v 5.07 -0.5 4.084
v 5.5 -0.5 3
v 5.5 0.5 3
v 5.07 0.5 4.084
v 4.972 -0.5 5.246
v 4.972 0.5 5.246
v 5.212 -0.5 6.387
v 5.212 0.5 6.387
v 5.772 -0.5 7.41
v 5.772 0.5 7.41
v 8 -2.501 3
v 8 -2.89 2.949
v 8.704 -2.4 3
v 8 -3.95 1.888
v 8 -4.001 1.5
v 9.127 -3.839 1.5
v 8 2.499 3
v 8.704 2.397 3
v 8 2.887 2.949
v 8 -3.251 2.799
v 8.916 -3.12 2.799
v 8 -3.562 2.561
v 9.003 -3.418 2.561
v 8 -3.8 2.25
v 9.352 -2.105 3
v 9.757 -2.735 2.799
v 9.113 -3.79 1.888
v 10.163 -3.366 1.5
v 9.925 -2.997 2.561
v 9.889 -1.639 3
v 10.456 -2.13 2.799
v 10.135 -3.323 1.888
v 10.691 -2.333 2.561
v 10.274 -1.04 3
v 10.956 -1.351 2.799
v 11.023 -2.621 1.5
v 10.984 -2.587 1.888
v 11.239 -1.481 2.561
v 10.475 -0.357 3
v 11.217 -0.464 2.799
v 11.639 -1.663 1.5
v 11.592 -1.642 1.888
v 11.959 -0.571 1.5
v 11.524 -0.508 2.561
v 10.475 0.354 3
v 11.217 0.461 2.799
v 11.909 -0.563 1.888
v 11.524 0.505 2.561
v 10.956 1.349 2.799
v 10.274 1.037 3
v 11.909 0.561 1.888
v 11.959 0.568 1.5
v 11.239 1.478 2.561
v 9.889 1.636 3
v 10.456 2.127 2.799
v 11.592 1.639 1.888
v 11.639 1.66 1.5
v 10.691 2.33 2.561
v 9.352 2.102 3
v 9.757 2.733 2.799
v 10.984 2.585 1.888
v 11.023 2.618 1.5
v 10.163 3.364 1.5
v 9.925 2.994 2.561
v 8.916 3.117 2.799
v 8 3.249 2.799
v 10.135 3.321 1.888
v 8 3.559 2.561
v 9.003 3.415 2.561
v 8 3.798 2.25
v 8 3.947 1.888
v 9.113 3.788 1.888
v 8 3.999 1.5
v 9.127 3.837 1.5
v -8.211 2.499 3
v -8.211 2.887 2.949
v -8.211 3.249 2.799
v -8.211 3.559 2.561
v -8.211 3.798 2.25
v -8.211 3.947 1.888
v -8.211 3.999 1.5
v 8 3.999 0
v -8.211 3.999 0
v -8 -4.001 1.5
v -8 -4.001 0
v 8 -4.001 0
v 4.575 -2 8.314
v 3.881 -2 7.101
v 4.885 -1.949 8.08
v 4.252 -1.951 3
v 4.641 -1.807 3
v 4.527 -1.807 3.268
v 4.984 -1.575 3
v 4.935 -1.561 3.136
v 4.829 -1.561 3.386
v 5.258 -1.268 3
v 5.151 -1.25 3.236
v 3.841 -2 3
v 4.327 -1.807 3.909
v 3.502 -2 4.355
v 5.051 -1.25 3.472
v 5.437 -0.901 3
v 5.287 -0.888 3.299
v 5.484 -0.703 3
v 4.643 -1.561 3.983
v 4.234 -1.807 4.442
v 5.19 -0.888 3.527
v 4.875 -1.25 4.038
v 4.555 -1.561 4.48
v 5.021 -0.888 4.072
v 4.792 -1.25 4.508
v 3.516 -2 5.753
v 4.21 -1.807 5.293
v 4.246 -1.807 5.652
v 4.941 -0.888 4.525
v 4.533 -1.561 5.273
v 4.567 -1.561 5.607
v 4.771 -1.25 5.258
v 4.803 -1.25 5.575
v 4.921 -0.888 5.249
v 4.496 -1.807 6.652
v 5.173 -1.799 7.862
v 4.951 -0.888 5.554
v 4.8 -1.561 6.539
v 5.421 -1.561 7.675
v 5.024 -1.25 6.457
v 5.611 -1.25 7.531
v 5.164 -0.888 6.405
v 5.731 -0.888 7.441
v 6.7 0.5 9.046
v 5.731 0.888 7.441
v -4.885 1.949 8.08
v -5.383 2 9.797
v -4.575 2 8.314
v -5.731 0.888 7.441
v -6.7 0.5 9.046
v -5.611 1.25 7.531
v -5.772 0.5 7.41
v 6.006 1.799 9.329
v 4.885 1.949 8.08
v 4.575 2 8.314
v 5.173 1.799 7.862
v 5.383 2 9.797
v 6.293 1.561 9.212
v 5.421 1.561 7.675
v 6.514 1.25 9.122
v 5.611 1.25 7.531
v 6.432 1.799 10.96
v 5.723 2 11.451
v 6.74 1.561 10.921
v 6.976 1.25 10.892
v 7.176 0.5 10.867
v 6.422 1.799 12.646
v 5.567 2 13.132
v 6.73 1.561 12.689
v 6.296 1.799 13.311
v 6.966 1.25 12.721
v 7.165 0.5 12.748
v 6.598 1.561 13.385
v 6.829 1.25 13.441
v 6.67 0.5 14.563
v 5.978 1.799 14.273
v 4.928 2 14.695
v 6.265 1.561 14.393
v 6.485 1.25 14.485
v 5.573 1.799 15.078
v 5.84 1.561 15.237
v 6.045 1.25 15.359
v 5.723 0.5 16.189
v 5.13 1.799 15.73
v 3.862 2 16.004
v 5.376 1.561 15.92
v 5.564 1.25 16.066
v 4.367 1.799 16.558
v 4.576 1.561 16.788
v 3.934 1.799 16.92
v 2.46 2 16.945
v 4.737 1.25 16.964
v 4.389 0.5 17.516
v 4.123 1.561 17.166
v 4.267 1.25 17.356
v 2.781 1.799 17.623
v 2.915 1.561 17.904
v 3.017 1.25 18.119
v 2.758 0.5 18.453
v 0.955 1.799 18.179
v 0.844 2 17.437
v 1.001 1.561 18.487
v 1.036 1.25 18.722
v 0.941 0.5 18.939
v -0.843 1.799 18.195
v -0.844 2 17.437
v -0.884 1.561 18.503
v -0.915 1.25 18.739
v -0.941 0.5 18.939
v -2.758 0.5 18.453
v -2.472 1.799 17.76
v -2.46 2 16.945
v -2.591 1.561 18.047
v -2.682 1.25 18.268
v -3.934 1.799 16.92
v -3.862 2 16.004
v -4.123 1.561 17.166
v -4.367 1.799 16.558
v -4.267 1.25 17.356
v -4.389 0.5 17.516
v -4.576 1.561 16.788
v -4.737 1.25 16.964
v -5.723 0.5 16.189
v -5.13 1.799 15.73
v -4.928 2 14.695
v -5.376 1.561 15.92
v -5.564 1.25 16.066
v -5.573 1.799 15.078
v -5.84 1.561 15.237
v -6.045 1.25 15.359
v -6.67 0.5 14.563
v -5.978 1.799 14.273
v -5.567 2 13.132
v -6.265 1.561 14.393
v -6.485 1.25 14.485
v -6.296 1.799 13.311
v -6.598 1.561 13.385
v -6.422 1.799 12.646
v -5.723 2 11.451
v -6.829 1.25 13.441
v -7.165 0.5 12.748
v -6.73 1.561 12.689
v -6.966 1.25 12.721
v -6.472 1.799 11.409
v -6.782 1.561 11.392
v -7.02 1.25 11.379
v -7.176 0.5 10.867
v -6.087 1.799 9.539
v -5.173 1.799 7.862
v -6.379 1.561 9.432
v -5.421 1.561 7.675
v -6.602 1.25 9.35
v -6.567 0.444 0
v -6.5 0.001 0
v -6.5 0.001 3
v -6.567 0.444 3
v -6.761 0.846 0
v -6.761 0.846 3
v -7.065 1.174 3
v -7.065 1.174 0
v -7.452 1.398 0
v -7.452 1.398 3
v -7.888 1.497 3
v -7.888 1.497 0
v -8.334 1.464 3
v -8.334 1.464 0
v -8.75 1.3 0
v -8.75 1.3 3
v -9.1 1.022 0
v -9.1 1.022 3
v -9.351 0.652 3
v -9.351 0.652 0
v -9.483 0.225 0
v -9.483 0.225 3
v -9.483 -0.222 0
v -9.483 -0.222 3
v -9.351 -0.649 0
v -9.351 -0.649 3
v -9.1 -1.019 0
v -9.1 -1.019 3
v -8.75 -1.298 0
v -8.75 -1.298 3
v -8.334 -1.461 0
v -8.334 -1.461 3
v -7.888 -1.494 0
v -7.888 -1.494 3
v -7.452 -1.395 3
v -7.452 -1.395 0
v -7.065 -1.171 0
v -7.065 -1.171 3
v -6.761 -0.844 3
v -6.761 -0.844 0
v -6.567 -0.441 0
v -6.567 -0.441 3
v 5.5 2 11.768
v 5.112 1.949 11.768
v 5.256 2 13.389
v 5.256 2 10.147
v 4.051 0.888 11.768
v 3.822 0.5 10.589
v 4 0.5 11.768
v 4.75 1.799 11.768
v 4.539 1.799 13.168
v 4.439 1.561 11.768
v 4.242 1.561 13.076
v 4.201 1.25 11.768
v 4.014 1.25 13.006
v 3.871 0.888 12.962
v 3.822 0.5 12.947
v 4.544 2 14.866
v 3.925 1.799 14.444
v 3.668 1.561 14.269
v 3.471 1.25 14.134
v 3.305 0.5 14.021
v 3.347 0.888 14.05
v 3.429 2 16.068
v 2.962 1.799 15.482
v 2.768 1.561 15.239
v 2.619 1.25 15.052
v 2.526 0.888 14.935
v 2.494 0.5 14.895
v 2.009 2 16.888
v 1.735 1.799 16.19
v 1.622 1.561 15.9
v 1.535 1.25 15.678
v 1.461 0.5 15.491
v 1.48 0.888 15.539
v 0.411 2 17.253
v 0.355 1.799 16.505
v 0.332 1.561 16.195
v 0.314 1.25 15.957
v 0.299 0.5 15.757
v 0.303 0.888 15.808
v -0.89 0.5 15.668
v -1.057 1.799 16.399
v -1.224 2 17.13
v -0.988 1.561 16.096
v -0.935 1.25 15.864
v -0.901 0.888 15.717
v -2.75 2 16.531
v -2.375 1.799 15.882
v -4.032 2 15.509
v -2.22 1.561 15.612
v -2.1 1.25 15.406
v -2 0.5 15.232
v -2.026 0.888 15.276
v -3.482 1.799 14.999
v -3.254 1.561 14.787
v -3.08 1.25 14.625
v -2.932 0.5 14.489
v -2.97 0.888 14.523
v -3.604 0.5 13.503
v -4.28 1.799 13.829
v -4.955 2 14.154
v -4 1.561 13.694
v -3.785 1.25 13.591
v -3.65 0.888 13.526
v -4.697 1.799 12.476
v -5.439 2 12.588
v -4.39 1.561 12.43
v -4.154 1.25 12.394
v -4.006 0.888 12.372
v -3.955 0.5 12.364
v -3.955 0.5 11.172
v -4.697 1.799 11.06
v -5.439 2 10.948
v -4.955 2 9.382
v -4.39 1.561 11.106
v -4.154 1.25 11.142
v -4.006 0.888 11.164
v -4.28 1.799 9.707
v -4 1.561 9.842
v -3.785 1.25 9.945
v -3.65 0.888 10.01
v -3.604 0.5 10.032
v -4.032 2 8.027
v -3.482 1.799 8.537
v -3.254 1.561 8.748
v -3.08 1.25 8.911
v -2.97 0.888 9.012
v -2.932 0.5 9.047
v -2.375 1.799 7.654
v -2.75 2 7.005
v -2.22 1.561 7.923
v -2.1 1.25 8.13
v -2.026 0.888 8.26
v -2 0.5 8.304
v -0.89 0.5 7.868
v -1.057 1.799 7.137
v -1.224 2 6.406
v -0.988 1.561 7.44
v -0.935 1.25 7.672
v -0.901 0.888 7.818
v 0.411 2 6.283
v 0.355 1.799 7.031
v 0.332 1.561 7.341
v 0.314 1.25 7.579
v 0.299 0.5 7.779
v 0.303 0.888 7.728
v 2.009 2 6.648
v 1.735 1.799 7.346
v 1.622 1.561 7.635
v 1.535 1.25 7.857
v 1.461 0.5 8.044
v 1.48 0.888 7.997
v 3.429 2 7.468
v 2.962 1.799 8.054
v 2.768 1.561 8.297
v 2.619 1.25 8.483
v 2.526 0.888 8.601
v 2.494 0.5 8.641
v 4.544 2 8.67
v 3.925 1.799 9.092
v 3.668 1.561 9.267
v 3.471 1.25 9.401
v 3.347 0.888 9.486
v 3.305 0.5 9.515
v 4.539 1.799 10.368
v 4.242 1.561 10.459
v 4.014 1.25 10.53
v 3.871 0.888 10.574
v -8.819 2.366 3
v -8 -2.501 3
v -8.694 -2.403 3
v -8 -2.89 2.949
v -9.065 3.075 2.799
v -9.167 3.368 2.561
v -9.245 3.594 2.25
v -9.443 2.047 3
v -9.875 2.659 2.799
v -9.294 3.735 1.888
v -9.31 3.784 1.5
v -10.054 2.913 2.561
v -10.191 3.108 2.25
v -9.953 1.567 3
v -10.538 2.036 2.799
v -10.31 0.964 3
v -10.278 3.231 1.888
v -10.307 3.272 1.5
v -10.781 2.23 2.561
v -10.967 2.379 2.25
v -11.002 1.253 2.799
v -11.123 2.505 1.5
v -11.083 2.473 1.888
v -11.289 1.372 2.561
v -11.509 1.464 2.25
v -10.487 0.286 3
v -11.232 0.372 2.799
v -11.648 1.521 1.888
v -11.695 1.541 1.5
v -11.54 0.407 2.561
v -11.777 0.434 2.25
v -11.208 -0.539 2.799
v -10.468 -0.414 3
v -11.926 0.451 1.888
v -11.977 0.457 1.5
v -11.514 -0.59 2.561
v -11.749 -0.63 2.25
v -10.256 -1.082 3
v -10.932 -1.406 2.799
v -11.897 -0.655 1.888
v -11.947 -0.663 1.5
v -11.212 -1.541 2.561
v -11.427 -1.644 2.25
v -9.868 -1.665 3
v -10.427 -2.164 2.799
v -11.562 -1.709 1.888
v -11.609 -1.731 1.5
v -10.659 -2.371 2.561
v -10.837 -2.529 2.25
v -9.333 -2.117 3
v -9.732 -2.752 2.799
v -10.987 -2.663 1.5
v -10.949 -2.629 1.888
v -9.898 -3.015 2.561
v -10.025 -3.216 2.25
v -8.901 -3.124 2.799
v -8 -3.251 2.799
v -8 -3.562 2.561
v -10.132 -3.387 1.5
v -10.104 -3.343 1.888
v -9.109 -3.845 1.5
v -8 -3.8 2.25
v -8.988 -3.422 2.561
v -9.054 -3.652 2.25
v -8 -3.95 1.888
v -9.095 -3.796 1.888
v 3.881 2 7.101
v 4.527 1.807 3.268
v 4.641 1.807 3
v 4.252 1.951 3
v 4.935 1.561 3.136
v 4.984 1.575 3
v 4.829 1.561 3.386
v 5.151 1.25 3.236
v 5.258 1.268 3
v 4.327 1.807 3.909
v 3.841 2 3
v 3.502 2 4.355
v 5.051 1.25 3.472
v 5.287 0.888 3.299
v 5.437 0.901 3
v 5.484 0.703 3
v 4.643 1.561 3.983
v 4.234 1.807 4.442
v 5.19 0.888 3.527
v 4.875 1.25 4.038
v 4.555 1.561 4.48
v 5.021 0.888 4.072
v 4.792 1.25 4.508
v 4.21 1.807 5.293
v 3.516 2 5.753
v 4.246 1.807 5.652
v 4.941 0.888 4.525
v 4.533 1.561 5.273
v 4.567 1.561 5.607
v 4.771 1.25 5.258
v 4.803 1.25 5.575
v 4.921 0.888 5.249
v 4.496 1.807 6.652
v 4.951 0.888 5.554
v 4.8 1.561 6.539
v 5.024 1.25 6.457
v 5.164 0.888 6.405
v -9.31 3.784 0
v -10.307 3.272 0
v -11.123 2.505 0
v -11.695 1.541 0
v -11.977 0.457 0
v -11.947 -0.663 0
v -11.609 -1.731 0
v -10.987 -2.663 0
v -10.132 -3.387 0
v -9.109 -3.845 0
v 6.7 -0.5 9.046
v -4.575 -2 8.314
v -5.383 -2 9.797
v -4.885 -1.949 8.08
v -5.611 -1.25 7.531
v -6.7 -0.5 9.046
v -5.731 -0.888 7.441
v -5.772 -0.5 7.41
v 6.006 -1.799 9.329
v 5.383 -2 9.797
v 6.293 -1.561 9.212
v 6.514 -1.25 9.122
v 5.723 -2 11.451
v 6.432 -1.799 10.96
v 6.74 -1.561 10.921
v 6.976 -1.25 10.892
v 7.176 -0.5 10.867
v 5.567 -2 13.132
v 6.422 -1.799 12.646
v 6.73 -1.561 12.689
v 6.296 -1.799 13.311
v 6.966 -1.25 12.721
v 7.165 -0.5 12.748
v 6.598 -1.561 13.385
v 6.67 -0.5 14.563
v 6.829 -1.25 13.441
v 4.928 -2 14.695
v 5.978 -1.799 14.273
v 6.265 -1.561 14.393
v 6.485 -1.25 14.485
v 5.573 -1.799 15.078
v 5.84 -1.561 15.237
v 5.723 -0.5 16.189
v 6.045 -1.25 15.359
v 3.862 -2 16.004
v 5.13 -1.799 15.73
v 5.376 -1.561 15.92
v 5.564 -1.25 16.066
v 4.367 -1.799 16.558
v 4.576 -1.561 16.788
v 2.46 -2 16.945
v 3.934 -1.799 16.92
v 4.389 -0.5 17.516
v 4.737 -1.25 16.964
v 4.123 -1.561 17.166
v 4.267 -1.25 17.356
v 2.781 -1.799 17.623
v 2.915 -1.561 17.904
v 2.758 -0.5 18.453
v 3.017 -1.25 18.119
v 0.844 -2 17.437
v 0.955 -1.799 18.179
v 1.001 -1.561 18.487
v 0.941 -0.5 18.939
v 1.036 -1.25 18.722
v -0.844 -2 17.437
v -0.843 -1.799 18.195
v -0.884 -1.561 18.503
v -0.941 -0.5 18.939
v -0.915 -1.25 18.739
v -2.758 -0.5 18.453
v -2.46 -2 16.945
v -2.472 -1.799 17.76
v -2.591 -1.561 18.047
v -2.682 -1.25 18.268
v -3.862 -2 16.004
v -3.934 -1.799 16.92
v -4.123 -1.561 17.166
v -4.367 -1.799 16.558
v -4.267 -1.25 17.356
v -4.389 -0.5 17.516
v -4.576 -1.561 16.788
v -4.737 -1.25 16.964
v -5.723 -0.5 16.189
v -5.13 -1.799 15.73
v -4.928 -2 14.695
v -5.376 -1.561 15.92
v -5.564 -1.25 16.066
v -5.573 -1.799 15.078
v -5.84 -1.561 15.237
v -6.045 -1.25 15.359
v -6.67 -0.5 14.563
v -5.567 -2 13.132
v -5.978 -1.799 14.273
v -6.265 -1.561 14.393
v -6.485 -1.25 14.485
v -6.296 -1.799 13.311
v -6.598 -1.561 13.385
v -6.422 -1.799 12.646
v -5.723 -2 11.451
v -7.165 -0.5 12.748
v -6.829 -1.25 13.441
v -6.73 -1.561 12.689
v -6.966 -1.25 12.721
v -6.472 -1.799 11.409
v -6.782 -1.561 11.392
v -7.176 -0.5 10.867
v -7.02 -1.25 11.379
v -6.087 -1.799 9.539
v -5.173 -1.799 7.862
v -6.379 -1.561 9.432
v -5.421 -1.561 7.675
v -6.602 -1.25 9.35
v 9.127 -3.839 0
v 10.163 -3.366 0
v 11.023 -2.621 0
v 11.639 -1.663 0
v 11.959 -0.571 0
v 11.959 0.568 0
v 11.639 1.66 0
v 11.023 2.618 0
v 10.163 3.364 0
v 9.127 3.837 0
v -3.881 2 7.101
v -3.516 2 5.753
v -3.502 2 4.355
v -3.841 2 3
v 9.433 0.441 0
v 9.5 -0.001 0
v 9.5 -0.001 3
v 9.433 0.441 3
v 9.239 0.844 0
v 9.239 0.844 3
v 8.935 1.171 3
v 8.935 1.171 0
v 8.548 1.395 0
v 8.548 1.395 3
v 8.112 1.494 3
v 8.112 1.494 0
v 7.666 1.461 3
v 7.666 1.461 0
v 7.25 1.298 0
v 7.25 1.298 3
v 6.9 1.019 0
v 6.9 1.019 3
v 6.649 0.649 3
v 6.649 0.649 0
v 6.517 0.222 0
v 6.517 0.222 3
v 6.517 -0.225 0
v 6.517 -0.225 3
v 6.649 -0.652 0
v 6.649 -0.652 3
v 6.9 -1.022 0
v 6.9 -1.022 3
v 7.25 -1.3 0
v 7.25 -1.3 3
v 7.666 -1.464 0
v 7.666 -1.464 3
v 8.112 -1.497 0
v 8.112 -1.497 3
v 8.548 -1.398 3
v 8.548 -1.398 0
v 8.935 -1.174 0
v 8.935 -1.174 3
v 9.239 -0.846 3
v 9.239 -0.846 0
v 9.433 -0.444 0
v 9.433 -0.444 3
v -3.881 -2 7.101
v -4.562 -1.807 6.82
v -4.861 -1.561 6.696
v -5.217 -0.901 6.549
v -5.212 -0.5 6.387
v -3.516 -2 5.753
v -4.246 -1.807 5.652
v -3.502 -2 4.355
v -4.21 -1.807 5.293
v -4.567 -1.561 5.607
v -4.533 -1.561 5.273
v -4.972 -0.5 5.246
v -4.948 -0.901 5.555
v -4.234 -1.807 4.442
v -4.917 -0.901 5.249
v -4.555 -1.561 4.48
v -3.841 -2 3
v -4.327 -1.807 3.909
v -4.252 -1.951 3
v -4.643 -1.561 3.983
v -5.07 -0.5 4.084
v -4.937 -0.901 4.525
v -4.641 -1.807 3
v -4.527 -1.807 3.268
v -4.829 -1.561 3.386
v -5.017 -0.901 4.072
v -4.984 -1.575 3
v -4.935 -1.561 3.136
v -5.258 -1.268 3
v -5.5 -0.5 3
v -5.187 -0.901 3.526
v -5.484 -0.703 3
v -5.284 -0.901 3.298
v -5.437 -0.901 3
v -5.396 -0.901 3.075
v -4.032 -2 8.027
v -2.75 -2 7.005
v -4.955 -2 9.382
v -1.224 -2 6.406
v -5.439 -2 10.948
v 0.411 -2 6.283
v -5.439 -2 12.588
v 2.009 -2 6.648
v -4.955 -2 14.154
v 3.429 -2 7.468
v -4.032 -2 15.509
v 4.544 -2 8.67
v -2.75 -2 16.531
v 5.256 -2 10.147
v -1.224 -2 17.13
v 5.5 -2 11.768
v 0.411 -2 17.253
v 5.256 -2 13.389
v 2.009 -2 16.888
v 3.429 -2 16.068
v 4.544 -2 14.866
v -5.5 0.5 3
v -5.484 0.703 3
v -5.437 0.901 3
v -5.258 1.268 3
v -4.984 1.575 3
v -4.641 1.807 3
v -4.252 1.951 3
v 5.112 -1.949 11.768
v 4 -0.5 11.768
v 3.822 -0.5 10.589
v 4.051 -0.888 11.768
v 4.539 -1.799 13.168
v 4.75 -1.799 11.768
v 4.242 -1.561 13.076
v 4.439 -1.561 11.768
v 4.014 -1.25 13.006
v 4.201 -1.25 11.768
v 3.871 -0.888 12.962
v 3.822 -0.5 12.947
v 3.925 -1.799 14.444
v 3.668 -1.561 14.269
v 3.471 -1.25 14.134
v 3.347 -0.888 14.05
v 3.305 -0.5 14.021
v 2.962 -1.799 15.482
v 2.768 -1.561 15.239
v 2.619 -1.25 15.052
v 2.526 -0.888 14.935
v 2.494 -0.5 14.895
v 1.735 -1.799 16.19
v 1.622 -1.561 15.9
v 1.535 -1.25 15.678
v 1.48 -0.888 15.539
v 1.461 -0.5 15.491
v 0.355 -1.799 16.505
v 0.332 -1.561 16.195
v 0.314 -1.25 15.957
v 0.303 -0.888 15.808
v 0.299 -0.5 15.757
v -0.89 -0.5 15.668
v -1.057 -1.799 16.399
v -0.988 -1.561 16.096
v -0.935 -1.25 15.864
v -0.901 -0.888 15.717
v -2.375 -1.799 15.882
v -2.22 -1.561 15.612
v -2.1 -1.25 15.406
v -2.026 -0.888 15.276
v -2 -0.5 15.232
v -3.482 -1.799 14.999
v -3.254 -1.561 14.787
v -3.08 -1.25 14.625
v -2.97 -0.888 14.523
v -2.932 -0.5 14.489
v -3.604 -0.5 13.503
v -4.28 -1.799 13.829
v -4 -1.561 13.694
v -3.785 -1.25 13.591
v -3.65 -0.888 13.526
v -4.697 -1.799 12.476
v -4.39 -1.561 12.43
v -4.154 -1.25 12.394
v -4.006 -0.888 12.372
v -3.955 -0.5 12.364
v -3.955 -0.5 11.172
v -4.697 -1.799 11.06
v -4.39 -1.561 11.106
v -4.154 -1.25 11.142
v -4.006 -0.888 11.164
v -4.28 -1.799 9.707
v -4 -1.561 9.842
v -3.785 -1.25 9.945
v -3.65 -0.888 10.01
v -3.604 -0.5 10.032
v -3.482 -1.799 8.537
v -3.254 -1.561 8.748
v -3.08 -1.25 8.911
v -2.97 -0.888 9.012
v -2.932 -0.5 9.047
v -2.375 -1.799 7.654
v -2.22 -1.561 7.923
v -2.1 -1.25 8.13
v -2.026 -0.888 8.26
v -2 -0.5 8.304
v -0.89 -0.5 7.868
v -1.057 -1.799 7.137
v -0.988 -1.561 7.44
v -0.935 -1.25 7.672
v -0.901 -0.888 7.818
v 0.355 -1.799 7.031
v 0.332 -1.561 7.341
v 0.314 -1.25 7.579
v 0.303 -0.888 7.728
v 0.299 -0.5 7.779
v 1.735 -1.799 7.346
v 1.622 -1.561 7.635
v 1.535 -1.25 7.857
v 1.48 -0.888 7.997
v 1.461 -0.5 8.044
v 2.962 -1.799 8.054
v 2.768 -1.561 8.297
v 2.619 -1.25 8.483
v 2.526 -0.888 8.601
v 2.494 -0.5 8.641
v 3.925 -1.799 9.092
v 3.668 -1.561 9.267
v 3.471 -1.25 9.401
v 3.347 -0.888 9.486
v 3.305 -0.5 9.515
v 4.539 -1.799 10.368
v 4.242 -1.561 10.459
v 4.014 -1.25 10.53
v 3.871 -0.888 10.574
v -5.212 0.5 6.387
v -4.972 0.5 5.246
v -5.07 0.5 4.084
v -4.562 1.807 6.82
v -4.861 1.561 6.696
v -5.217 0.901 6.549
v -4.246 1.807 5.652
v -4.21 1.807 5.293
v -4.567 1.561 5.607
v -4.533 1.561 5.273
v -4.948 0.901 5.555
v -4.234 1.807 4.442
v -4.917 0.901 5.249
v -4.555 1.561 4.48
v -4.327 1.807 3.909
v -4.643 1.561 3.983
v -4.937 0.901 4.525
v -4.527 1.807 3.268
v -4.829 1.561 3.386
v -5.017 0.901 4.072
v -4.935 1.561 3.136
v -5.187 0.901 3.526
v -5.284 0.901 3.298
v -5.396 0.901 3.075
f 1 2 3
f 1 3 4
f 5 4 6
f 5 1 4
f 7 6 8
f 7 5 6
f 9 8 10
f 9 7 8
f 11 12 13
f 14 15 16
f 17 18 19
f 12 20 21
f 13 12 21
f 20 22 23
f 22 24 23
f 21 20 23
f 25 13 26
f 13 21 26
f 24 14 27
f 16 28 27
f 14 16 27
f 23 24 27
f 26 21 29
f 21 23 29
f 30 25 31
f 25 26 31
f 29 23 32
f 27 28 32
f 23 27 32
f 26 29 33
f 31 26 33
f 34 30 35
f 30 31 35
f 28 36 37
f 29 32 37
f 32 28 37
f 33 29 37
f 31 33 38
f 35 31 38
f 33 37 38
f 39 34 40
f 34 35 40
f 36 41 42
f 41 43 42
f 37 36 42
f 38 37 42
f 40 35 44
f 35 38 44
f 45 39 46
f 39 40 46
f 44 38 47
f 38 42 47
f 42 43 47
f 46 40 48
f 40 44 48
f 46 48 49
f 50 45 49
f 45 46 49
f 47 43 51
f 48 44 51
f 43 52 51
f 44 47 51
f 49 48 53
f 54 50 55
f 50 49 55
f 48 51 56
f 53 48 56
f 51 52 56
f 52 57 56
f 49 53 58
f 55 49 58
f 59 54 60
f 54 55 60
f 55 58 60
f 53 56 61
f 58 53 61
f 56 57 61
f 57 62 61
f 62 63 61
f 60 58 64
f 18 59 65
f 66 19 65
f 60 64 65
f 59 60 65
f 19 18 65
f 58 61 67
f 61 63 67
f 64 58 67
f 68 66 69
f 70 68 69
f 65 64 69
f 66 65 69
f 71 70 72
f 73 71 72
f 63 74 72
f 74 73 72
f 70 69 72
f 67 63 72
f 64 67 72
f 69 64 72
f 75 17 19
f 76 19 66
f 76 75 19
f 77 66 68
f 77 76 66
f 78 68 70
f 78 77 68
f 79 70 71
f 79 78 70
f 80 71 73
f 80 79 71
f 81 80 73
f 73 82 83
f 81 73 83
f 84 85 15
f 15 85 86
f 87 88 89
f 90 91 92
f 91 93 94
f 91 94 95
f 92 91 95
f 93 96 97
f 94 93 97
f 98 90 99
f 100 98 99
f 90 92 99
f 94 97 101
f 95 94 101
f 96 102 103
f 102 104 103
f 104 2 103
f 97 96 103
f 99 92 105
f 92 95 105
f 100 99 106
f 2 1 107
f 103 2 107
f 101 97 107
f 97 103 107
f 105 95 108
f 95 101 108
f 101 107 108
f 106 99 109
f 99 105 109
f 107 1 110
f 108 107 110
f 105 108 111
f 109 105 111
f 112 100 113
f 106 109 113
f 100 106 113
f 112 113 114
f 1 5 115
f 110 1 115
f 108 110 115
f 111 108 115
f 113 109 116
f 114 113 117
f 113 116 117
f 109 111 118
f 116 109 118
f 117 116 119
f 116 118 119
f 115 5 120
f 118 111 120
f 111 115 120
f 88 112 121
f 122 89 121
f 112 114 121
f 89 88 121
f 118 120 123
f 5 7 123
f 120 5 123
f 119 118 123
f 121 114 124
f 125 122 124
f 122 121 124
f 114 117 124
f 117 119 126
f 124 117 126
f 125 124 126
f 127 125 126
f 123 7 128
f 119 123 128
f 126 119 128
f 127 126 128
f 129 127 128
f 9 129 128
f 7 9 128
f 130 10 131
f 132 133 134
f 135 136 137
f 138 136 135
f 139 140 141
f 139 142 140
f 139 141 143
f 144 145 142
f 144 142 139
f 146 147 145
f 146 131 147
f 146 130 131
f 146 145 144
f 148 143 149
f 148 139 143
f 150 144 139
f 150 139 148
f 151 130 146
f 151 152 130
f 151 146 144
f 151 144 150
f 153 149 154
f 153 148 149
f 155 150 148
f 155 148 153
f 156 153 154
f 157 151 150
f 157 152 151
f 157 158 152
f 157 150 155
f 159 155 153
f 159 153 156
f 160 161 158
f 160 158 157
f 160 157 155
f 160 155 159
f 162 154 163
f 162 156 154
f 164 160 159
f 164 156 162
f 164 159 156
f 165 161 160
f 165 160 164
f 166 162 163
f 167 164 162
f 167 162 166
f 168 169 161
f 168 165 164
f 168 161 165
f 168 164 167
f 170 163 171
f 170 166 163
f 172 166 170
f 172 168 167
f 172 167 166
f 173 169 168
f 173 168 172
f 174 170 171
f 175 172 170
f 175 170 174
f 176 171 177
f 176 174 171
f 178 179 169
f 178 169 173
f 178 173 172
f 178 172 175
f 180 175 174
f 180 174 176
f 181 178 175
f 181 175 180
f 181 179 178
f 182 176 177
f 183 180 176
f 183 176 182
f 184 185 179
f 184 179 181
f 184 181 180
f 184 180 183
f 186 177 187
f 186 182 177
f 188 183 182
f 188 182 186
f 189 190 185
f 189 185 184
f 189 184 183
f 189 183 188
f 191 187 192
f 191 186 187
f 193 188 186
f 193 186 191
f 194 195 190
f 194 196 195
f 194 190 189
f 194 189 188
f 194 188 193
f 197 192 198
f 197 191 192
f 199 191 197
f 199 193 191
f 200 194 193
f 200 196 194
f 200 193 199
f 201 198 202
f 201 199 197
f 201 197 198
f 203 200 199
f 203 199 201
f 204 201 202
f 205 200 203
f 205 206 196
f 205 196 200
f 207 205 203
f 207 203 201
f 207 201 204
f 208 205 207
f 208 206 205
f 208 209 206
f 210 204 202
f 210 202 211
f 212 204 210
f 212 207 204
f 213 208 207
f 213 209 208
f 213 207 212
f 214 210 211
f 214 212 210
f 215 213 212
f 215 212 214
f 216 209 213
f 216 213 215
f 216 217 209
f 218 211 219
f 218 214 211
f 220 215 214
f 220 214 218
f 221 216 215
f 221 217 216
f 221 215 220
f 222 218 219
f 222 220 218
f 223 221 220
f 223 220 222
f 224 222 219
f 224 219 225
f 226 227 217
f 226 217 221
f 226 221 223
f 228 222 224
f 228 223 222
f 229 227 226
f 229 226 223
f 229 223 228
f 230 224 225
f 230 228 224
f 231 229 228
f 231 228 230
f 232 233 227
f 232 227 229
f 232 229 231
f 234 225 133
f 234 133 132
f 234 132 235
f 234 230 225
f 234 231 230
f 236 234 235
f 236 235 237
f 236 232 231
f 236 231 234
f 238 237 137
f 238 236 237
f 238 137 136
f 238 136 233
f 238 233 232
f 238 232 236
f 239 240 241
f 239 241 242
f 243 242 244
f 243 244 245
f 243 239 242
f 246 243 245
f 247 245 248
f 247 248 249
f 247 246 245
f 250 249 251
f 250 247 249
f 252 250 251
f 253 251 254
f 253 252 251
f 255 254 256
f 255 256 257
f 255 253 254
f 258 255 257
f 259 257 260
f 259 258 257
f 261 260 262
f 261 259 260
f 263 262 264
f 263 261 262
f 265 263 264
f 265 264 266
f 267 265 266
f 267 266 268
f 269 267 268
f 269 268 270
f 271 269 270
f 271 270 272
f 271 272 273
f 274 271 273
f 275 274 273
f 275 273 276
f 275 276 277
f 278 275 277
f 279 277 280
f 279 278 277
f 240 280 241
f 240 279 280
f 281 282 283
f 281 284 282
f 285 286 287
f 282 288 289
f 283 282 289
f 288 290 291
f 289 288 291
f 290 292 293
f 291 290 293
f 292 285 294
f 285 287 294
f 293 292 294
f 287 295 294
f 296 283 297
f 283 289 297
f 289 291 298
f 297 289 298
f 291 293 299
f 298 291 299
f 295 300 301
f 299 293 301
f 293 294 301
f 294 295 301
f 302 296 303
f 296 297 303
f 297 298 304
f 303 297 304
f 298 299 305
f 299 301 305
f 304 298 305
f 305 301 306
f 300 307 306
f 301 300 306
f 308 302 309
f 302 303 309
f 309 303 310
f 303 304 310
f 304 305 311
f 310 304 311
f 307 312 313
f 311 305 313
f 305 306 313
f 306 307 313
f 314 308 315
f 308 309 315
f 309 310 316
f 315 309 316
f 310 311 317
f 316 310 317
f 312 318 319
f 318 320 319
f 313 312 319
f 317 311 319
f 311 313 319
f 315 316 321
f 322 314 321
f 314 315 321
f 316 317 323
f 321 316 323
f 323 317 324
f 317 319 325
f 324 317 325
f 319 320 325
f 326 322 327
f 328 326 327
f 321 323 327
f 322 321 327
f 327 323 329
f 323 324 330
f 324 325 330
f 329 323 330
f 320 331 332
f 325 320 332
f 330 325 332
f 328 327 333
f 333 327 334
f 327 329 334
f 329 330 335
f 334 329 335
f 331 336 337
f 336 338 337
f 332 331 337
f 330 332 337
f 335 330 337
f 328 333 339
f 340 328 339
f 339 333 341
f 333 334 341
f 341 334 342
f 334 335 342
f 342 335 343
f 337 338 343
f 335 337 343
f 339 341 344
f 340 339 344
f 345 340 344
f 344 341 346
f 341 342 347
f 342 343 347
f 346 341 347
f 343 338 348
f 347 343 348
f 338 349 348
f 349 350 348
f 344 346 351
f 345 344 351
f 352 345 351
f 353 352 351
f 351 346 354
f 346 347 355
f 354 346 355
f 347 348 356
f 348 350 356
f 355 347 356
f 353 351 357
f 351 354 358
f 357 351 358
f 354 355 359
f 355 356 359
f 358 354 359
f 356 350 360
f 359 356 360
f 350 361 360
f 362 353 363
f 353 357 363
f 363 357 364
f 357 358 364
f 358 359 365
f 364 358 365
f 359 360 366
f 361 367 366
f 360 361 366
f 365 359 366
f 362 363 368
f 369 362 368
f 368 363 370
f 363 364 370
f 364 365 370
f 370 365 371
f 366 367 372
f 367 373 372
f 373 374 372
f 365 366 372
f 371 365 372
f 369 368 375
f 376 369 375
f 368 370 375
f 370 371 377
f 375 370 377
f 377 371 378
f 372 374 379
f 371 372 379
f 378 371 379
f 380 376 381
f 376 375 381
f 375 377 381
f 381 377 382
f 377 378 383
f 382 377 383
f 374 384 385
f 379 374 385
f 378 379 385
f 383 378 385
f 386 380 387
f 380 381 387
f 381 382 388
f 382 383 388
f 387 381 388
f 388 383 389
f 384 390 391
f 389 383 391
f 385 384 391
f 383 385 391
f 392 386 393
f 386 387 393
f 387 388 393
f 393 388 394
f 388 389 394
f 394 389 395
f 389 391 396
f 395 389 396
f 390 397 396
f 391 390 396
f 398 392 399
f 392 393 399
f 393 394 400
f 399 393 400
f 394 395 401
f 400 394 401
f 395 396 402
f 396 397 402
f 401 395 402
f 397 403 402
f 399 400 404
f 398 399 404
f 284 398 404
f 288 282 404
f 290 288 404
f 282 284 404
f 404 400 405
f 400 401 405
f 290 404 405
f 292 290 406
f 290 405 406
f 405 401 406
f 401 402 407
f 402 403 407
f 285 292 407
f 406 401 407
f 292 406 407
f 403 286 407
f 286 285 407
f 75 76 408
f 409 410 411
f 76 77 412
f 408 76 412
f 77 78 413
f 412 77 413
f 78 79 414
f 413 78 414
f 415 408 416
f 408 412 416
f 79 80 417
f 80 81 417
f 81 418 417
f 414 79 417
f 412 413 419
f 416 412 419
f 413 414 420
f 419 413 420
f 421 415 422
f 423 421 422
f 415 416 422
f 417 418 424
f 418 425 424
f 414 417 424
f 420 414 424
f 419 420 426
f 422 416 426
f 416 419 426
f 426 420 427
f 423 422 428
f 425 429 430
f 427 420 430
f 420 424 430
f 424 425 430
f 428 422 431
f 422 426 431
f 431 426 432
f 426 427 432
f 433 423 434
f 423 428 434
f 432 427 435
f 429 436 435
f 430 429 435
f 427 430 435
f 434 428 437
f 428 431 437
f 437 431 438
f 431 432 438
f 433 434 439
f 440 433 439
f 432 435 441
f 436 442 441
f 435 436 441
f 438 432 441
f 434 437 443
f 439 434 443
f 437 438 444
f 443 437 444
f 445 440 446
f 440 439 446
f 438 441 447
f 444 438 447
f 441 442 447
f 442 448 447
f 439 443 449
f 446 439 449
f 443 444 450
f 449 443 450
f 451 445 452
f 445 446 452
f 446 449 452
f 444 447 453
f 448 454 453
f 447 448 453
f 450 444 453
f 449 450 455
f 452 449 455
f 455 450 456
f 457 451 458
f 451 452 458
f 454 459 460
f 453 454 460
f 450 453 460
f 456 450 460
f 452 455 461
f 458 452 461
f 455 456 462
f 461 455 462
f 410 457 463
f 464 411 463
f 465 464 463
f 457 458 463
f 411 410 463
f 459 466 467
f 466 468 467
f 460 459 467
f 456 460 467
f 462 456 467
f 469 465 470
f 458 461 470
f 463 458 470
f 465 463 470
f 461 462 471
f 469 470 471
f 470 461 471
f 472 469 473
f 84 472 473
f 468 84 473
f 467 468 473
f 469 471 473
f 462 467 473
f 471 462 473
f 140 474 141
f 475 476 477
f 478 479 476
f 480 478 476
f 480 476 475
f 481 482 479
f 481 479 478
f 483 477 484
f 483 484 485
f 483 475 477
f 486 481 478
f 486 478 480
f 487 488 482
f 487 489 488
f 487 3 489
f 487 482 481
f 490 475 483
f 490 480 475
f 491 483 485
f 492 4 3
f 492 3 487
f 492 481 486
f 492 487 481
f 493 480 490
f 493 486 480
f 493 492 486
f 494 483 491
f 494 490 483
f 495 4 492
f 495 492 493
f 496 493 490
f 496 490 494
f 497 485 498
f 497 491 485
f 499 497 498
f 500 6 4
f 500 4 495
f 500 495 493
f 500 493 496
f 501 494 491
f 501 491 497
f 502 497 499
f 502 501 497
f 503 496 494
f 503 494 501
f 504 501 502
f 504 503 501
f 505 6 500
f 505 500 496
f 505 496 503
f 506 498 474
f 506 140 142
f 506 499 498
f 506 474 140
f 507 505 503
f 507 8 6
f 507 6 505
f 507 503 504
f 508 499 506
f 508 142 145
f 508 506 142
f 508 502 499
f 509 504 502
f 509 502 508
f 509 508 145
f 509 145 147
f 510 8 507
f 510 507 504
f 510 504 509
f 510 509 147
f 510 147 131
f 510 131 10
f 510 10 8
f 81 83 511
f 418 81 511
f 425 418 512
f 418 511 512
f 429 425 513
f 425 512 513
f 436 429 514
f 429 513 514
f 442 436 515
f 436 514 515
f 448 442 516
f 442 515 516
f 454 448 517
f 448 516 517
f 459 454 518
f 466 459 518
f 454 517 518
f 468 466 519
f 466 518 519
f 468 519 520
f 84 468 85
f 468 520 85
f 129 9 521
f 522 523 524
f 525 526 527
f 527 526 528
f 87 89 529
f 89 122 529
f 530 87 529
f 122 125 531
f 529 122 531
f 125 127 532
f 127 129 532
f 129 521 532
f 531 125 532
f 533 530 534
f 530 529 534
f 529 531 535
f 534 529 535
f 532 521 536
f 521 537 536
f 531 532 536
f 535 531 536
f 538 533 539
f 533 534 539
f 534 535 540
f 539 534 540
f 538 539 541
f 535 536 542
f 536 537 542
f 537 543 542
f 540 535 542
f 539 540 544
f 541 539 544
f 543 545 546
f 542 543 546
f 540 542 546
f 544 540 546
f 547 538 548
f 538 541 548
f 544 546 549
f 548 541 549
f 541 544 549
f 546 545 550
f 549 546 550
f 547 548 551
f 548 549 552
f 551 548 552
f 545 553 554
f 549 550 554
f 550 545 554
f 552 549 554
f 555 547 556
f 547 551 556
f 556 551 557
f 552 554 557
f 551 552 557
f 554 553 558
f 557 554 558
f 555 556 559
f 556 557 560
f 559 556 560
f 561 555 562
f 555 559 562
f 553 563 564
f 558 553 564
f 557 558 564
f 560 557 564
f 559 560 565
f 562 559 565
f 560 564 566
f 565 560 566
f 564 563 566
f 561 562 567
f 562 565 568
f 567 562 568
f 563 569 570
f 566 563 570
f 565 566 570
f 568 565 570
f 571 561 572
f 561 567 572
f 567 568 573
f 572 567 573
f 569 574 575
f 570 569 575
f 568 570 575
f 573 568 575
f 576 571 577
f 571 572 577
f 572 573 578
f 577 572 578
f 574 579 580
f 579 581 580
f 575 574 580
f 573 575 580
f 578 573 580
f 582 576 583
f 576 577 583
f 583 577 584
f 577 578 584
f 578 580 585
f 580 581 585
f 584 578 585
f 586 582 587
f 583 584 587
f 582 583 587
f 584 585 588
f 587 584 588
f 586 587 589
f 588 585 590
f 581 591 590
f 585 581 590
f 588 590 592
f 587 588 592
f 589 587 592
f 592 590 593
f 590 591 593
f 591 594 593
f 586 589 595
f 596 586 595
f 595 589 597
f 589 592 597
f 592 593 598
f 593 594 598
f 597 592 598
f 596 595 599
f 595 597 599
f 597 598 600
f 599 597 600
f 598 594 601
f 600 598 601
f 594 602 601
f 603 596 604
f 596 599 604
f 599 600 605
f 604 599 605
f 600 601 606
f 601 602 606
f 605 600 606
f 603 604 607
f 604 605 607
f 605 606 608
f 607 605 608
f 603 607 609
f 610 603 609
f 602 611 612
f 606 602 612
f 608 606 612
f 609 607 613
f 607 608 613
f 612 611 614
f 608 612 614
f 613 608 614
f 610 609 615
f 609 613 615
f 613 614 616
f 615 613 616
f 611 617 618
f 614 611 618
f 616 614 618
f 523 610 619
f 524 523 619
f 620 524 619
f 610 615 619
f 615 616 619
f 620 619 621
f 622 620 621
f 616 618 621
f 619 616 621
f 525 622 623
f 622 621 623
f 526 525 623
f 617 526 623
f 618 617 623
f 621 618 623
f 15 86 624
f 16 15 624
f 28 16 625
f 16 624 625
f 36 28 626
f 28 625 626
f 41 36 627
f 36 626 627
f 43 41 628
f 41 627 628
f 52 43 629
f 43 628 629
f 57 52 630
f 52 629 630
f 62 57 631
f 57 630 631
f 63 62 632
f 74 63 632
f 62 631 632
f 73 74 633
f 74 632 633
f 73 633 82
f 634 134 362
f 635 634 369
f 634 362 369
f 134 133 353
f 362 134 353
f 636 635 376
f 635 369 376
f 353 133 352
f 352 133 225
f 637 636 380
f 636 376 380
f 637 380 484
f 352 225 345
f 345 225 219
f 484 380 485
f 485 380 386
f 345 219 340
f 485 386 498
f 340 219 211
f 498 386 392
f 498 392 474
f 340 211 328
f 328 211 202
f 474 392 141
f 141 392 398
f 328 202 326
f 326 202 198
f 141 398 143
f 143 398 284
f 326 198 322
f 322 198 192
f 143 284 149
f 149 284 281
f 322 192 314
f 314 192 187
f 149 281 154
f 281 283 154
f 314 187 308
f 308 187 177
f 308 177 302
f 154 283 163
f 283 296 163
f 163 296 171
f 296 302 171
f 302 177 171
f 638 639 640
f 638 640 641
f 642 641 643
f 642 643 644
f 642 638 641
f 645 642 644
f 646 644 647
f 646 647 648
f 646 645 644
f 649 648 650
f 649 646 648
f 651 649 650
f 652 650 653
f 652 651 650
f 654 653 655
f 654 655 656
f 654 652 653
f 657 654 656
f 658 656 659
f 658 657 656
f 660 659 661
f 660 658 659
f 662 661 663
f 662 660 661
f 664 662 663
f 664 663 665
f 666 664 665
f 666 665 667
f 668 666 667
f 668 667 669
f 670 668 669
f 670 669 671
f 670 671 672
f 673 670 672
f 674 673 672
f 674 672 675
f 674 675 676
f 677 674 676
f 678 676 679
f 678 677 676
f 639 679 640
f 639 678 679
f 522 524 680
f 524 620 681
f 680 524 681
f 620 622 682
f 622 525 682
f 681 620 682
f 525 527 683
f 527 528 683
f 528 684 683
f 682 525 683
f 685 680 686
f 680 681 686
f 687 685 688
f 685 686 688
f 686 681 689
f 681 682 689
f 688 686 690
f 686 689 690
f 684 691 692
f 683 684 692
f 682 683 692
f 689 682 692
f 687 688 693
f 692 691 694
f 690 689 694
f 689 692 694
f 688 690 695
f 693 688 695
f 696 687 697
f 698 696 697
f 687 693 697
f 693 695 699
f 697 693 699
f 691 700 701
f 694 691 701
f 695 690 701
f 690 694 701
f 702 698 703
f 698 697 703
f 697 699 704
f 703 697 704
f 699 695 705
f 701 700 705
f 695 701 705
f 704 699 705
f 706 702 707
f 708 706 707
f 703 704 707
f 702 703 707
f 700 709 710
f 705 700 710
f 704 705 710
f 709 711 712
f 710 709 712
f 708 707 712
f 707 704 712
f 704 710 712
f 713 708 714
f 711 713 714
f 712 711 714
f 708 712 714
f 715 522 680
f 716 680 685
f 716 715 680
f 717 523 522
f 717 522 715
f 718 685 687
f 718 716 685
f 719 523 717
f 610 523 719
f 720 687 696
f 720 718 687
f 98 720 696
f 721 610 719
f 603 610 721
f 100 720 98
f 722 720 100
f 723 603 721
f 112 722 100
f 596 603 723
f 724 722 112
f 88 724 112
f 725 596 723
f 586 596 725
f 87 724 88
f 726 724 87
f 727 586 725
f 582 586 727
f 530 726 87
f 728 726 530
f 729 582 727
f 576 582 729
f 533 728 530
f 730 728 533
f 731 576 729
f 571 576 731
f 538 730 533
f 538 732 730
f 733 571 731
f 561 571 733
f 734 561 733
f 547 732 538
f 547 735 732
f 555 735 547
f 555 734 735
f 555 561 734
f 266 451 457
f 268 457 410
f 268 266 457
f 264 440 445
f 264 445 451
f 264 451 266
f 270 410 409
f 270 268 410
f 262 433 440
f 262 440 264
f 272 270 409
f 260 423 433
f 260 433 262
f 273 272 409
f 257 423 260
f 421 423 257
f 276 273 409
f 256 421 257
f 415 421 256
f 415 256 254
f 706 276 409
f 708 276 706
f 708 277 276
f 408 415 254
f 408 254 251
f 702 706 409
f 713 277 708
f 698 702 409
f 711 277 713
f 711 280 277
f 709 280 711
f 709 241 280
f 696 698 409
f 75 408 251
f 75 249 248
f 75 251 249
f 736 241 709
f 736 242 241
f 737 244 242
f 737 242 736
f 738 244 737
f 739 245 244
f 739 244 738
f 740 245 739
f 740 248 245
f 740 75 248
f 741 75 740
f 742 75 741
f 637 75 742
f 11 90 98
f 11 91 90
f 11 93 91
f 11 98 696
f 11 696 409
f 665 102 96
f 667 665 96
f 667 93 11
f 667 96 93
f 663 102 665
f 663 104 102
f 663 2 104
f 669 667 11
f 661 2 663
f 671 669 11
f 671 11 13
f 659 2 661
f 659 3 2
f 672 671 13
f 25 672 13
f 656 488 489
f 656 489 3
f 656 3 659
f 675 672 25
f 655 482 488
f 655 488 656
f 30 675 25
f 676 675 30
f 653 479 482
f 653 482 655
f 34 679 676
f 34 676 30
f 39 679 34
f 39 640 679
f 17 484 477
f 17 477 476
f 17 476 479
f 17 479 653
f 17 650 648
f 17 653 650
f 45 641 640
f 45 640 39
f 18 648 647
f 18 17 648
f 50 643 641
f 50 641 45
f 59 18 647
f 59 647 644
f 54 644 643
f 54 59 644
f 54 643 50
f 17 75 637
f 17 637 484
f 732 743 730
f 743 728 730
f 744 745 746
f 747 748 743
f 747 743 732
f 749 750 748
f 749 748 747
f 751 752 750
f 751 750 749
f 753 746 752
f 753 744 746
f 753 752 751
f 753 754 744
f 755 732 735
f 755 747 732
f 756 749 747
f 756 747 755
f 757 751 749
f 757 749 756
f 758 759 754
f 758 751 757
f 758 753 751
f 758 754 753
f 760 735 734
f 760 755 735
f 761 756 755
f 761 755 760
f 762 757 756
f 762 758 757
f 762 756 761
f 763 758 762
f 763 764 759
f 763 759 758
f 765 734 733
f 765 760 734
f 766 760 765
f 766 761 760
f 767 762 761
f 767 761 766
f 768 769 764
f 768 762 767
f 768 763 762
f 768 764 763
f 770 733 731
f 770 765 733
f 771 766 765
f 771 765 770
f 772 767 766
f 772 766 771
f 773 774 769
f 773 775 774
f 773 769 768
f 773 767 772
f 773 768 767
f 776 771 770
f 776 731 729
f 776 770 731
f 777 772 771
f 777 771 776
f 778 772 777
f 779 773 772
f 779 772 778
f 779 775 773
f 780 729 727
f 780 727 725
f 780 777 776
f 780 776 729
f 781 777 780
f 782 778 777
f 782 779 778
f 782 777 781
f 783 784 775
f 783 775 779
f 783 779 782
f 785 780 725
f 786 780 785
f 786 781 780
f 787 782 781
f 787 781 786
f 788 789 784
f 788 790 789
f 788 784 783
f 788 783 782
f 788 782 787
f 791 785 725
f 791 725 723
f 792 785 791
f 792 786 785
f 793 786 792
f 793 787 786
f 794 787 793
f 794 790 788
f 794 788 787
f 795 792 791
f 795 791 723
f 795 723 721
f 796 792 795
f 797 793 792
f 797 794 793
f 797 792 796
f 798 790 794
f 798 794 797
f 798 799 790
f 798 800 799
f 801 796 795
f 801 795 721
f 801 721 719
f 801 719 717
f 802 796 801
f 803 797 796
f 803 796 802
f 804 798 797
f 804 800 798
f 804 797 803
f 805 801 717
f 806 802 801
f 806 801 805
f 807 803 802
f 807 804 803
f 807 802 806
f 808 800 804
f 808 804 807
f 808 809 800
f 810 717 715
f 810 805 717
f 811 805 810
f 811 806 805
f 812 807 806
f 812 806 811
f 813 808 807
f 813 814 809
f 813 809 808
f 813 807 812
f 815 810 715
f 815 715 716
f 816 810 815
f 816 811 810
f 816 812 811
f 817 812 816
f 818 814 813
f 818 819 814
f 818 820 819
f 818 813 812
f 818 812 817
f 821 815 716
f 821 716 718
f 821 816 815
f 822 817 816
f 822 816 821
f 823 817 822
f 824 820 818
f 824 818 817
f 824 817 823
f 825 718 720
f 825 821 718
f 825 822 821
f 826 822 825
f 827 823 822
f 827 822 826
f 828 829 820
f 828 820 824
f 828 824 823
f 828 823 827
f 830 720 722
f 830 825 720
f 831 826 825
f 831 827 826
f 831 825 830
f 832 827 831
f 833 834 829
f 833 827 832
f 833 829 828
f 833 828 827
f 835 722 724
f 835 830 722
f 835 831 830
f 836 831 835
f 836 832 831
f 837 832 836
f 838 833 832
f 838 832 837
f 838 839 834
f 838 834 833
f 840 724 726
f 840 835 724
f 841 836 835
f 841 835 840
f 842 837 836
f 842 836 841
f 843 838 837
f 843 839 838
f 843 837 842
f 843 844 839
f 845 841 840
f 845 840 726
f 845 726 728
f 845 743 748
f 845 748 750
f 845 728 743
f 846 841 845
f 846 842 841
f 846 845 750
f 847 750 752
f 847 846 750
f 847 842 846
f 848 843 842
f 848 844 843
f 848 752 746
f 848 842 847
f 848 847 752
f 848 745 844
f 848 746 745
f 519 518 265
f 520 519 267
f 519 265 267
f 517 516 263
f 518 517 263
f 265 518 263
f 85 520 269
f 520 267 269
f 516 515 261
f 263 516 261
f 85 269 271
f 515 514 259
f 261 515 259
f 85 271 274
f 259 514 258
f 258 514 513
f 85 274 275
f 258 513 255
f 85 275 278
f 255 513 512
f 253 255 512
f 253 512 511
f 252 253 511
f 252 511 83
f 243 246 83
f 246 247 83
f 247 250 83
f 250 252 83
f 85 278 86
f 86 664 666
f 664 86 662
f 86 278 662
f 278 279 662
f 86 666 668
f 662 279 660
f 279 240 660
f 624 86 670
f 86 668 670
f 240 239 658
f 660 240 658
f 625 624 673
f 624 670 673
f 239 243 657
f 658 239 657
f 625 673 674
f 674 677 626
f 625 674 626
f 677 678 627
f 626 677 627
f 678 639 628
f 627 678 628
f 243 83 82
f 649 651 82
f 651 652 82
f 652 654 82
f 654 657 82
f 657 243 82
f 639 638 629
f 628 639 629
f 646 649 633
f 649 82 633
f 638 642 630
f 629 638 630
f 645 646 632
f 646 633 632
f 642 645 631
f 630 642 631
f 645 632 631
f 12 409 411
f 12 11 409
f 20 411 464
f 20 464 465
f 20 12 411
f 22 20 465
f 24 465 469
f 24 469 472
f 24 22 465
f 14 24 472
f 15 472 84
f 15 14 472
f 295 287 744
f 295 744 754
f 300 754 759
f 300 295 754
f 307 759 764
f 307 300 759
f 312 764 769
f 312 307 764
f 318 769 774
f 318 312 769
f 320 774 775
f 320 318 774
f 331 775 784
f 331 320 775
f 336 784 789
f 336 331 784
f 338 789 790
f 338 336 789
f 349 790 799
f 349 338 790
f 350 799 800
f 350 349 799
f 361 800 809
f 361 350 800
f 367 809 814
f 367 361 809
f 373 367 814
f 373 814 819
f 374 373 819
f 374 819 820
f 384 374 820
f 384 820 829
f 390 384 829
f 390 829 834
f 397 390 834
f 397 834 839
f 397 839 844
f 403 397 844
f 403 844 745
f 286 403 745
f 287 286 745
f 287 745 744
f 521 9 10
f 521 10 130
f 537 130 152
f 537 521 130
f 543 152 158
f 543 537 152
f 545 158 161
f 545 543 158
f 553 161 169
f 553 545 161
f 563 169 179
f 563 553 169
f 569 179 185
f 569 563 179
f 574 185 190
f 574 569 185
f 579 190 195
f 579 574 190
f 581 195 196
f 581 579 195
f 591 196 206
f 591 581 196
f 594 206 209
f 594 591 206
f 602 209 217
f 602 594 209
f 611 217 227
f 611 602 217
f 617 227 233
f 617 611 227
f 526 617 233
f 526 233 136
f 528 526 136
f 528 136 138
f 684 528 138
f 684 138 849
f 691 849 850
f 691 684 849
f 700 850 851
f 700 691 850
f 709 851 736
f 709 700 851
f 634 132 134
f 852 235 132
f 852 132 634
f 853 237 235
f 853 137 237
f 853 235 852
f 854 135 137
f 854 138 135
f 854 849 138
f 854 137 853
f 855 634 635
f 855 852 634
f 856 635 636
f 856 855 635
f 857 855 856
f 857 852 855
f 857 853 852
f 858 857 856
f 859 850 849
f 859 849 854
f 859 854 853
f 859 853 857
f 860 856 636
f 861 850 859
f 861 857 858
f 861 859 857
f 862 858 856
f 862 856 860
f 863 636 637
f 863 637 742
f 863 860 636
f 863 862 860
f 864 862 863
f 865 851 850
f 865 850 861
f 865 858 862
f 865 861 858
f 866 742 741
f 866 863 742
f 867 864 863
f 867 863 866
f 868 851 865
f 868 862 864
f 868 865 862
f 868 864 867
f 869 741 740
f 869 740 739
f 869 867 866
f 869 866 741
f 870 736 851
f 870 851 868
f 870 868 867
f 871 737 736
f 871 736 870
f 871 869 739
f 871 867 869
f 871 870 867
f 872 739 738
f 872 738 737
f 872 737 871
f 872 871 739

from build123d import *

# Parameters (mm, degrees)
F0_R     = 1.5
F1_DEPTH = 3
F2_R     = 4
F3_DEPTH = 2
F4_R     = 1.5


# Not quite as in the source:
# - a feature names something its author has since deleted; it is built from what else it names


with BuildPart() as f1:
    # F0 (on Top) → F1 (new body)
    with BuildSketch(Plane.XY):
        with BuildLine():
            Line((7.9999998792, 3.9986097976), (-8.2109180559, 3.9986097976))
            ThreePointArc((-8.2109180559, 3.9986097976), (-12.0013898401, -0.104105532), (-7.9999998792, -4.0013902024))
            Line((-7.9999998792, -4.0013902024), (7.9999998792, -4.0013902024))
            ThreePointArc((7.9999998792, -4.0013902024), (11.9999998792, -0.0013902024), (7.9999998792, 3.9986097976))
        make_face()
        with Locations((-7.9999998792, 0.0013902024)):
            Circle(F0_R, mode=Mode.SUBTRACT)
        with Locations((7.9999998792, -0.0013902024)):
            Circle(F0_R, mode=Mode.SUBTRACT)
    extrude(amount=F1_DEPTH)

    # F2 (on Front) → F3 (join, symmetric)
    with BuildSketch(Plane.XZ):
        with BuildLine():
            Line((-5.5, 3), (5.5, 3))
            ThreePointArc((5.5, 3), (4.9716755174, 5.2460362856), (5.7717823496, 7.4102069842))
            ThreePointArc((5.7717823496, 7.4102069842), (0, 19), (-5.7717823496, 7.4102069842))
            ThreePointArc((-5.7717823496, 7.4102069842), (-4.9716755174, 5.2460362856), (-5.5, 3))
        make_face()
        with Locations((0, 11.7679133954)):
            Circle(F2_R, mode=Mode.SUBTRACT)
    extrude(amount=F3_DEPTH, both=True)

    # F4
    f4_edges = [f1.edges().sort_by_distance(p)[0] for p in [
        (0, -2, 19),
        (0, 2, 19),
        (0, -4.00139, 3),
        (-4, -2, 11.767913),
        (-4, 2, 11.767913),
    ]]
    fillet(f4_edges, radius=F4_R)


solid = f1.part
